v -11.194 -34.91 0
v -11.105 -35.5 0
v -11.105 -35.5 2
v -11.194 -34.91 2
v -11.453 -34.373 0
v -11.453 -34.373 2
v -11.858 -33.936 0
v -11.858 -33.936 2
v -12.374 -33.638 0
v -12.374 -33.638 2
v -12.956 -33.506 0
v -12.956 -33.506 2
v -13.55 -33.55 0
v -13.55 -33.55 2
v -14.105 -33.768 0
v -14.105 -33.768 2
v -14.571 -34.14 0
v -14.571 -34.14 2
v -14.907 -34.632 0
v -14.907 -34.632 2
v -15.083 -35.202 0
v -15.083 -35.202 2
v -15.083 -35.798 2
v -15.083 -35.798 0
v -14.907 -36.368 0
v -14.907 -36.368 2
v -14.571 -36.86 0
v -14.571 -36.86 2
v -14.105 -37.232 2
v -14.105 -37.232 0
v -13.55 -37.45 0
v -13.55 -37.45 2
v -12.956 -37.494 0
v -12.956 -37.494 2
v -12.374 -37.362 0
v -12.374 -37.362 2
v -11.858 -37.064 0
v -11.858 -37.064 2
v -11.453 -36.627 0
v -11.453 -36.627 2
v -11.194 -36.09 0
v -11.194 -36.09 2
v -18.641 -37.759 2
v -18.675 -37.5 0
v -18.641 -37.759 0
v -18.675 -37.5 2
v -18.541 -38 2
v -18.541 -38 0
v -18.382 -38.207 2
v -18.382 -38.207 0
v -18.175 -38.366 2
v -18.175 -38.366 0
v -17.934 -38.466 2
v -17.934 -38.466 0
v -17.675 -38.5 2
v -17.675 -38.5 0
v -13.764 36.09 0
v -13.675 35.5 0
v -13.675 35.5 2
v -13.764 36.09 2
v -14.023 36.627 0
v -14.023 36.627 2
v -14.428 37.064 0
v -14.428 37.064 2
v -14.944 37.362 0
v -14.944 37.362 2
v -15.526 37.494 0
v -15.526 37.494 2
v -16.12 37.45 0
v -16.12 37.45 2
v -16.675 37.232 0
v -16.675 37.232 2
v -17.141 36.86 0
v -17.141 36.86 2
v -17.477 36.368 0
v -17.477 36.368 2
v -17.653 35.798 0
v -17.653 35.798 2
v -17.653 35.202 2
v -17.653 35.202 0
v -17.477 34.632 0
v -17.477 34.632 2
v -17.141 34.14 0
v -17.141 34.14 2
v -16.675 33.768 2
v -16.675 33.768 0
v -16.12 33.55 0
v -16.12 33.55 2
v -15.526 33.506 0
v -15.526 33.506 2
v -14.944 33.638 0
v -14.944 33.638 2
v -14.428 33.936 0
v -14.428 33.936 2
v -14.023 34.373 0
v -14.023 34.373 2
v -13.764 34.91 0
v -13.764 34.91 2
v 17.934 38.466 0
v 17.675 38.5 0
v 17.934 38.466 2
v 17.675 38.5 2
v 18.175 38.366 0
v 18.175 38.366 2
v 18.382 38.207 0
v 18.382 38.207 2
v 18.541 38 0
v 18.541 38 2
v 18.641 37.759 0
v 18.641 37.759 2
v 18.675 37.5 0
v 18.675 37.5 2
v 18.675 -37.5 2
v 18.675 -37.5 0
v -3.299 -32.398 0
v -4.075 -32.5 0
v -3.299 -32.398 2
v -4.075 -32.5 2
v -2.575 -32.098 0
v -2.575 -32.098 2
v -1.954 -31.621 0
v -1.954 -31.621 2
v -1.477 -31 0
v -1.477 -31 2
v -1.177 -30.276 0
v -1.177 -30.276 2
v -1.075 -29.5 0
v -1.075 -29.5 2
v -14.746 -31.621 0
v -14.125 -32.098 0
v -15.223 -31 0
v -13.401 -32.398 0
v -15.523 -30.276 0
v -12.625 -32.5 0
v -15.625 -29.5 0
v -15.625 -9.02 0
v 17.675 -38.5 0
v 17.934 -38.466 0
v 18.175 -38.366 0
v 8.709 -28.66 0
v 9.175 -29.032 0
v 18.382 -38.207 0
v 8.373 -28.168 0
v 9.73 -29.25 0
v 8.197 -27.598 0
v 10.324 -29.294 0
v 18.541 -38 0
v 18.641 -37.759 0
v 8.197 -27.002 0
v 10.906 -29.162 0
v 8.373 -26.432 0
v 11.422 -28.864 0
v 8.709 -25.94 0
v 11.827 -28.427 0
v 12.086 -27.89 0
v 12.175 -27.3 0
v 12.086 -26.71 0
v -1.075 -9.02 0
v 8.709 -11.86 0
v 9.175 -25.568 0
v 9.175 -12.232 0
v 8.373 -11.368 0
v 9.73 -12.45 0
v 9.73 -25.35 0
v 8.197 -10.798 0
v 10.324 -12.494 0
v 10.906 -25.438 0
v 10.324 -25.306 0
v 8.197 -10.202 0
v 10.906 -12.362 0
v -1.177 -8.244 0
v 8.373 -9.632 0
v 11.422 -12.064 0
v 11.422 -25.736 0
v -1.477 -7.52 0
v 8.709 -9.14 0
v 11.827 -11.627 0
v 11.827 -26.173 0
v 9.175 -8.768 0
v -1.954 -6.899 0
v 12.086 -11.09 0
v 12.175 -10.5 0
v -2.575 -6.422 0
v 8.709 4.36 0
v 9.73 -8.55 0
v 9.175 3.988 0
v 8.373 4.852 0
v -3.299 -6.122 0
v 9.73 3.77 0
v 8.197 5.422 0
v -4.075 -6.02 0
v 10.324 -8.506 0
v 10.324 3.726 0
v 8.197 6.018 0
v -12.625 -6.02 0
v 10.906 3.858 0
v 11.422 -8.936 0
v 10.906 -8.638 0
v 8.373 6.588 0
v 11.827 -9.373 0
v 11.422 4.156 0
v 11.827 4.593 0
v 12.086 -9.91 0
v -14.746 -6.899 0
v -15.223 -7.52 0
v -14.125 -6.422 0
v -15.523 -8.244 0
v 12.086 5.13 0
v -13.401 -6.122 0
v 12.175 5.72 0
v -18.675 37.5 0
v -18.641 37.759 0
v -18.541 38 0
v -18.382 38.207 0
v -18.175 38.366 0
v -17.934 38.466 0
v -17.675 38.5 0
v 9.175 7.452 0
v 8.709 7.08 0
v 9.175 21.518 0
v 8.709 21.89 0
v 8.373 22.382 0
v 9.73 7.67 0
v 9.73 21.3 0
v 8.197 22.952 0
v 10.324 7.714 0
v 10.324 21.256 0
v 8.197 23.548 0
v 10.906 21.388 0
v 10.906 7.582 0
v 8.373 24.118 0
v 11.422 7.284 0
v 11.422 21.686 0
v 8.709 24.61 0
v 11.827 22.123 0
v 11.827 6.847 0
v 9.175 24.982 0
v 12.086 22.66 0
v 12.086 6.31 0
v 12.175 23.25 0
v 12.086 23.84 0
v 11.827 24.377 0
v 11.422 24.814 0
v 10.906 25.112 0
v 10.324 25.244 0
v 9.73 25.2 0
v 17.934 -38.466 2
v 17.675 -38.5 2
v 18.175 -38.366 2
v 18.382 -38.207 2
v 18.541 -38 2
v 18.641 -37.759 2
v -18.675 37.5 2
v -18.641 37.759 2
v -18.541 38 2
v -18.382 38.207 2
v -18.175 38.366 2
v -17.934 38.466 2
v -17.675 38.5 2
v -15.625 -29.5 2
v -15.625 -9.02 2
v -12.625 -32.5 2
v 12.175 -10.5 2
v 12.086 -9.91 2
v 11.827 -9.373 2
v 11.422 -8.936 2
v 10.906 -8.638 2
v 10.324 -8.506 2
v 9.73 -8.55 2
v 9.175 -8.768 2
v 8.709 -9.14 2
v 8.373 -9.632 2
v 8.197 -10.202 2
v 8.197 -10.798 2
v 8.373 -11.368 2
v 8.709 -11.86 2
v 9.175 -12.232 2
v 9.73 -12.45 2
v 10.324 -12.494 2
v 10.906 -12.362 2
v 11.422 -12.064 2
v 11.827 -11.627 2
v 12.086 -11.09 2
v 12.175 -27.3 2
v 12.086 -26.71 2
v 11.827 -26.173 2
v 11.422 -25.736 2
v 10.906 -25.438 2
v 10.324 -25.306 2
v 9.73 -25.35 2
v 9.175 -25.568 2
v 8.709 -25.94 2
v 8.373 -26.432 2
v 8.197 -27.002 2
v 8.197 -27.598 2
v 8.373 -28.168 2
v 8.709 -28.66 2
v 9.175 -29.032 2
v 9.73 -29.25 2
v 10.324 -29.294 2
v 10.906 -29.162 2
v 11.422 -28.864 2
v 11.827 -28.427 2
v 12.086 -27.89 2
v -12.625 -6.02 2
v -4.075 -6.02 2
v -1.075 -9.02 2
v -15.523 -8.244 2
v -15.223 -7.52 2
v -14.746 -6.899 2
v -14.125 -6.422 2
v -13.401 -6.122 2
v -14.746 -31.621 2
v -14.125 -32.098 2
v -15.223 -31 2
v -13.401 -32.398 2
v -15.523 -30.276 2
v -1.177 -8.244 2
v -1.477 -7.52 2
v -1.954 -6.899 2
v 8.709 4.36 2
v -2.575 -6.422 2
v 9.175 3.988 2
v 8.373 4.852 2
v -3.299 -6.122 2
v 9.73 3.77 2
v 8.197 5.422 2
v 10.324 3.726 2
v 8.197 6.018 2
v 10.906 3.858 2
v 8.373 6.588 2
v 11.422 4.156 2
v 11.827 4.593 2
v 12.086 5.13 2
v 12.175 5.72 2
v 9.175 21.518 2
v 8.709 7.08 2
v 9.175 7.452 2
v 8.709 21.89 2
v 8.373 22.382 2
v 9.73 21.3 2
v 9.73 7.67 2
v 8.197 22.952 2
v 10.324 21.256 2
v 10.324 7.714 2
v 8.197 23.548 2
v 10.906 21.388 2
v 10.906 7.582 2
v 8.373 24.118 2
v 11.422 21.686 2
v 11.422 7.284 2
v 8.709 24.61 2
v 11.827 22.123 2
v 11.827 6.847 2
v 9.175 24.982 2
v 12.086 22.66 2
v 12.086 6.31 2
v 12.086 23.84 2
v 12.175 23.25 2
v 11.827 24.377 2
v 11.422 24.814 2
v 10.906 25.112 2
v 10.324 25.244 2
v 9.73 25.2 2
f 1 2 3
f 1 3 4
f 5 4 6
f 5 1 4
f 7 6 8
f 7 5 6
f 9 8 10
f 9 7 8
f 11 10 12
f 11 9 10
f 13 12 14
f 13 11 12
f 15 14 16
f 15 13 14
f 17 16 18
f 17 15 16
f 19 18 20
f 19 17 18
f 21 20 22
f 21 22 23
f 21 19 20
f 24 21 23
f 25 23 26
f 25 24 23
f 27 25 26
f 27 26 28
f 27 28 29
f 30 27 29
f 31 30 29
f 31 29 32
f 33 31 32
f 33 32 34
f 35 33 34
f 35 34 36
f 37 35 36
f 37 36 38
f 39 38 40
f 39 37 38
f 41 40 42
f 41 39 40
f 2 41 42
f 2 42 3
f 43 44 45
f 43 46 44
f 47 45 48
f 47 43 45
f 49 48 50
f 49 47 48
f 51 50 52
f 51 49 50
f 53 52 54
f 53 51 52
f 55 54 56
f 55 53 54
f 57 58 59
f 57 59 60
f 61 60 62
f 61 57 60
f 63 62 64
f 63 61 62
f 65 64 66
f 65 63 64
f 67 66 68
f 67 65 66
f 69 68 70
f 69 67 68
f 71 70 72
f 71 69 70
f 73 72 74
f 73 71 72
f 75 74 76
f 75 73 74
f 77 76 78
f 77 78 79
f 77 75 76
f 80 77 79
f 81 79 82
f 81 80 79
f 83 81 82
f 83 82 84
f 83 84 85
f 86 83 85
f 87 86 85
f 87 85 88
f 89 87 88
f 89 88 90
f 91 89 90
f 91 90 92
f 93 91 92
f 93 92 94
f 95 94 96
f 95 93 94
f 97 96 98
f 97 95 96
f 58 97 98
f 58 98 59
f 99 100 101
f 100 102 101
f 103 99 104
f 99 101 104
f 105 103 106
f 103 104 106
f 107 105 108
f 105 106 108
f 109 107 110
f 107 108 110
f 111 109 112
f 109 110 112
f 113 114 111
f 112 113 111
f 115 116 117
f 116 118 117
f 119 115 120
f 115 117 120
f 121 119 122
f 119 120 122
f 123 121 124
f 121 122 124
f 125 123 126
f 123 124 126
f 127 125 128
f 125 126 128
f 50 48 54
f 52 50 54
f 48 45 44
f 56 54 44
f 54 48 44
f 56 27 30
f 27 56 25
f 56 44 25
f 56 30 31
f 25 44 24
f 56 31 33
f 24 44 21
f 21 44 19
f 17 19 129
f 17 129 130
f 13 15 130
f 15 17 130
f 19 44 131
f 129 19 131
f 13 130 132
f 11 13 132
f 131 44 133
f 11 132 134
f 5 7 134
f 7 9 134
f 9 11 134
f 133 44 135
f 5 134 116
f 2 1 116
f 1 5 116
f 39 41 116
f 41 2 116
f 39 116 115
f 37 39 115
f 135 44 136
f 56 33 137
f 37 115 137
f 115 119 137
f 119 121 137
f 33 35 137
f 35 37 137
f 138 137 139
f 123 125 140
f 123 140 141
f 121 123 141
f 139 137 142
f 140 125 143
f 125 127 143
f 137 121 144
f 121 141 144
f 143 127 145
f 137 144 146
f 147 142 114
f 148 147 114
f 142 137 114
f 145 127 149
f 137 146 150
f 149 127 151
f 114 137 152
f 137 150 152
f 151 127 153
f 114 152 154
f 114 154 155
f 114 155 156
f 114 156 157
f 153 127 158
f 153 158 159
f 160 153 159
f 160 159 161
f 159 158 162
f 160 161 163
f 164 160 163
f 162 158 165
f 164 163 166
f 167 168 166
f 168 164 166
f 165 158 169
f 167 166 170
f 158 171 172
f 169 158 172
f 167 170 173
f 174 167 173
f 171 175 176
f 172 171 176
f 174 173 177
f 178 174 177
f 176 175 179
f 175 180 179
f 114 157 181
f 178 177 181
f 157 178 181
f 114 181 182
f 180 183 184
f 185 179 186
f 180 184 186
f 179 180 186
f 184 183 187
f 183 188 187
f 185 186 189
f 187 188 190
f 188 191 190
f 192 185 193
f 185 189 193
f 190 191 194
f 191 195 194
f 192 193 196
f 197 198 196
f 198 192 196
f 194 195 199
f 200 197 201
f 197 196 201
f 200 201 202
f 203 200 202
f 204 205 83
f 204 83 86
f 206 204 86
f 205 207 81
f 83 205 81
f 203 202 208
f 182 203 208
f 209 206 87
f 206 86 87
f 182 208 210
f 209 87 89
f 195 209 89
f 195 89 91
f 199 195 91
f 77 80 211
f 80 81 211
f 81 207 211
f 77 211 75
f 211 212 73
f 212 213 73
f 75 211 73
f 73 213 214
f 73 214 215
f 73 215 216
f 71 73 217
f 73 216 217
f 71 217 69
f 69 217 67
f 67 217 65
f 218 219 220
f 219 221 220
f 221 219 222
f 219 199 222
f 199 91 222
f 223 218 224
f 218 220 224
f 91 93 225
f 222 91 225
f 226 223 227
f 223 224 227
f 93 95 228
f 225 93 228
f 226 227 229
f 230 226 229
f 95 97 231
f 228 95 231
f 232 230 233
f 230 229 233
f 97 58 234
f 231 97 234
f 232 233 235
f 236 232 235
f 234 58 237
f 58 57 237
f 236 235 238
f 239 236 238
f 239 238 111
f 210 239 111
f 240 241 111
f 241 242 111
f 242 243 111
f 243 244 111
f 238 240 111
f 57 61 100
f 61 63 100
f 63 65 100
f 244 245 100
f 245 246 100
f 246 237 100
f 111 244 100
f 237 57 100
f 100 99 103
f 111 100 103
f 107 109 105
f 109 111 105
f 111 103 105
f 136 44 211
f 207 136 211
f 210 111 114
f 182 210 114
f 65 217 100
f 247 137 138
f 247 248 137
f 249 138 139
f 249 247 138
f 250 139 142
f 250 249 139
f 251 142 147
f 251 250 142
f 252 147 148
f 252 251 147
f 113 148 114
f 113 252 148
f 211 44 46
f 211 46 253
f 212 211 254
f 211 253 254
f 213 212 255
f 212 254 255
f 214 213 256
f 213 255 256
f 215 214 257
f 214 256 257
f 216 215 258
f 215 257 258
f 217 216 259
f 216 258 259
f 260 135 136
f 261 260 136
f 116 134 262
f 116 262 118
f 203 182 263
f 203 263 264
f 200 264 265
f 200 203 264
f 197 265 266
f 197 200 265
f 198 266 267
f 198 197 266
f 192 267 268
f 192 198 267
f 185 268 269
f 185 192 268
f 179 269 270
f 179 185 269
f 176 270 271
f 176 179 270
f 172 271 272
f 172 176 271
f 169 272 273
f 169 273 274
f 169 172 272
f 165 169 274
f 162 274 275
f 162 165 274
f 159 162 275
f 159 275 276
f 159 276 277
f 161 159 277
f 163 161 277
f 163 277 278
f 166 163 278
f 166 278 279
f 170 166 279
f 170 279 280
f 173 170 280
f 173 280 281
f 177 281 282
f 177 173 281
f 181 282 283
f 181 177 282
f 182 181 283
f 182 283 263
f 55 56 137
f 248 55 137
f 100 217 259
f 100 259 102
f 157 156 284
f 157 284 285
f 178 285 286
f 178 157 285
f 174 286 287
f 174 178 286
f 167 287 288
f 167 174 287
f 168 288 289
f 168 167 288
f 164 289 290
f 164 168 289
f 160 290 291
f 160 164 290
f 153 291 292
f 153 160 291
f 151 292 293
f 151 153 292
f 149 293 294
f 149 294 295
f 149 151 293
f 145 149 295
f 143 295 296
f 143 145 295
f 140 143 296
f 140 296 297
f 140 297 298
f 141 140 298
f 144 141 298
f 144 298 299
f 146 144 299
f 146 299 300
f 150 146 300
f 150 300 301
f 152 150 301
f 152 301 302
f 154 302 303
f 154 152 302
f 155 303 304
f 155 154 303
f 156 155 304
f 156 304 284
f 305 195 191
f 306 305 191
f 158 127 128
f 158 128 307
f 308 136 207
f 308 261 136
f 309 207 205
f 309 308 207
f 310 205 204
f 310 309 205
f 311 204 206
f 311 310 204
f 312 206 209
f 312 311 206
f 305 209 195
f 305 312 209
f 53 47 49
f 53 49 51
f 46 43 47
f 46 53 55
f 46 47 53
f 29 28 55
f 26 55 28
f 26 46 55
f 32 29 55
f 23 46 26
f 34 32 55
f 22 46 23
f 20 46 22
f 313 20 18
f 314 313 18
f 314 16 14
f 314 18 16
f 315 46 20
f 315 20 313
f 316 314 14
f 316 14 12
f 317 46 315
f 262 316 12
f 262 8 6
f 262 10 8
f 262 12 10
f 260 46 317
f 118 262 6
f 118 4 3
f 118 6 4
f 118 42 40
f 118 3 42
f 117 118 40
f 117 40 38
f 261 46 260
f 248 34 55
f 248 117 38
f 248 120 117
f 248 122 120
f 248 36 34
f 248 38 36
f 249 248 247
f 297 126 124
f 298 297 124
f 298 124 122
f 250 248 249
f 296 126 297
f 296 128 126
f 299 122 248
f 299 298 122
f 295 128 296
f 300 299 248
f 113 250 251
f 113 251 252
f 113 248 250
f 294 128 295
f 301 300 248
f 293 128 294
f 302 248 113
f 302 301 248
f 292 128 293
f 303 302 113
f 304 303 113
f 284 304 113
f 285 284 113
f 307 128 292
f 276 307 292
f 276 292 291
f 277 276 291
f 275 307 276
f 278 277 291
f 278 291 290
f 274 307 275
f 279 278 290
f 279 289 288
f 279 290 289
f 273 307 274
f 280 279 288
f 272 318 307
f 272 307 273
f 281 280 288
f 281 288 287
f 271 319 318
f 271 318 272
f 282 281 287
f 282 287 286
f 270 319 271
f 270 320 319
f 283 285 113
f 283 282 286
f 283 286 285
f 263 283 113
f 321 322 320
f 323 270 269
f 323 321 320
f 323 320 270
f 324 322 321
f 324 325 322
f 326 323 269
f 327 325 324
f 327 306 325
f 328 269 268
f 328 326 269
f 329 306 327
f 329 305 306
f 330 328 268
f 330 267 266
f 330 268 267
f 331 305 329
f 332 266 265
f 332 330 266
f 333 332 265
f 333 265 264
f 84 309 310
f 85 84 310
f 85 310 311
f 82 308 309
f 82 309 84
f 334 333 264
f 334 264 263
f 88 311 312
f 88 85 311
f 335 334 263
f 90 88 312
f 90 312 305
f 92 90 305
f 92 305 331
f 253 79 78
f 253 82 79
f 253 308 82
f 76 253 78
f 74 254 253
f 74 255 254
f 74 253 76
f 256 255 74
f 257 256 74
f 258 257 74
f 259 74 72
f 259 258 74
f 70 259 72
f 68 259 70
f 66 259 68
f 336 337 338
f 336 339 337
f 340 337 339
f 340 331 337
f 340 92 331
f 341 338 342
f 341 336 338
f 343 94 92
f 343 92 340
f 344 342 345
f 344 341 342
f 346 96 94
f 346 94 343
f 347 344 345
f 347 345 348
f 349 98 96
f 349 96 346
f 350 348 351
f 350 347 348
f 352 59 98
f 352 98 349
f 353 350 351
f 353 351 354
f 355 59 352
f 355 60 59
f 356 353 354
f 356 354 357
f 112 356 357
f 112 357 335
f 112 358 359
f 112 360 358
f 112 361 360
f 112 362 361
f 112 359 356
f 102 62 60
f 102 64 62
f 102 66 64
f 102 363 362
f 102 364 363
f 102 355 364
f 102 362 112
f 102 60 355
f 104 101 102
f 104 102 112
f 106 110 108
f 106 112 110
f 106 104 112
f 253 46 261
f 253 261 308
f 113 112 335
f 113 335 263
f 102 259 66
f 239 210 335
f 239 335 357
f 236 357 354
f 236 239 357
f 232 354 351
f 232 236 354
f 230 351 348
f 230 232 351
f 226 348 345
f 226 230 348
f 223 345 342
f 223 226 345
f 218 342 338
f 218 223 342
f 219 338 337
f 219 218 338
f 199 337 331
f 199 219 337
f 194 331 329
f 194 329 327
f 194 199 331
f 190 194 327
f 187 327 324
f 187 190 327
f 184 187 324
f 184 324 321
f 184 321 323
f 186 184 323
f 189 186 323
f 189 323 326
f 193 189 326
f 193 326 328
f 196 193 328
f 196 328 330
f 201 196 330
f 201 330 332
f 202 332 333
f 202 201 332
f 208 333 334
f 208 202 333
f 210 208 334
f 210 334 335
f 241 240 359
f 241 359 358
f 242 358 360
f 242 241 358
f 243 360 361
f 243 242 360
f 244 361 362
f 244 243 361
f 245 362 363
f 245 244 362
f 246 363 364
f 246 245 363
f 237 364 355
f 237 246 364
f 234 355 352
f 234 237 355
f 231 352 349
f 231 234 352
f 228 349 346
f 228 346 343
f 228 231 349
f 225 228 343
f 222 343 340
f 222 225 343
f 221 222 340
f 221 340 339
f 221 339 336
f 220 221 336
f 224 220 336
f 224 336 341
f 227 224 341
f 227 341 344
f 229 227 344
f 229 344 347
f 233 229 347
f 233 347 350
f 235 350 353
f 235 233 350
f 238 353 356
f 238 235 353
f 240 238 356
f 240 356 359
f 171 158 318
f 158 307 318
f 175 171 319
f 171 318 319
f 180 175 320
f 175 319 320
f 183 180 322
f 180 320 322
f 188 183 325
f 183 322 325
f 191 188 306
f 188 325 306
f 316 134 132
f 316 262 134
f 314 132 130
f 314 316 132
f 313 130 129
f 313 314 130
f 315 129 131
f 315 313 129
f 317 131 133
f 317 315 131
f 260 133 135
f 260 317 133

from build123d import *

# Parameters (mm, degrees)
F0_W     = 37.35
F0_H     = 77
F0_R     = 2
F0_W_2   = 14.55
F0_H_2   = 26.48
F1_DEPTH = 2
F2_R     = 3
F3_R     = 1


# Not quite as in the source:
# - a feature of the source that left no trace in its solid (it failed there, or was rolled back) is left out


with BuildPart() as f1:
    # F0 (on Top) → F1 (new body)
    with BuildSketch(Plane.XY):
        Rectangle(F0_W, F0_H)
        with Locations((-13.105, -35.5)):
            Circle(F0_R, mode=Mode.SUBTRACT)
        with Locations((-8.35, -19.26)):
            Rectangle(F0_W_2, F0_H_2, mode=Mode.SUBTRACT)
        with Locations((10.175, -27.3)):
            Circle(F0_R, mode=Mode.SUBTRACT)
        with Locations((10.175, -10.5)):
            Circle(F0_R, mode=Mode.SUBTRACT)
        with Locations((-15.675, 35.5)):
            Circle(F0_R, mode=Mode.SUBTRACT)
        with Locations((10.175, 5.72)):
            Circle(F0_R, mode=Mode.SUBTRACT)
        with Locations((10.175, 23.25)):
            Circle(F0_R, mode=Mode.SUBTRACT)
    extrude(amount=F1_DEPTH)

    # F2
    f2_edges = [f1.edges().sort_by_distance(p)[0] for p in [
        (-1.075, -6.02, 1),
        (-1.075, -32.5, 1),
        (-15.625, -32.5, 1),
        (-15.625, -6.02, 1),
    ]]
    fillet(f2_edges, radius=F2_R)

    # F3
    f3_edges = [f1.edges().sort_by_distance(p)[0] for p in [
        (-18.675, -38.5, 1),
        (18.675, -38.5, 1),
        (18.675, 38.5, 1),
        (-18.675, 38.5, 1),
    ]]
    fillet(f3_edges, radius=F3_R)


solid = f1.part
